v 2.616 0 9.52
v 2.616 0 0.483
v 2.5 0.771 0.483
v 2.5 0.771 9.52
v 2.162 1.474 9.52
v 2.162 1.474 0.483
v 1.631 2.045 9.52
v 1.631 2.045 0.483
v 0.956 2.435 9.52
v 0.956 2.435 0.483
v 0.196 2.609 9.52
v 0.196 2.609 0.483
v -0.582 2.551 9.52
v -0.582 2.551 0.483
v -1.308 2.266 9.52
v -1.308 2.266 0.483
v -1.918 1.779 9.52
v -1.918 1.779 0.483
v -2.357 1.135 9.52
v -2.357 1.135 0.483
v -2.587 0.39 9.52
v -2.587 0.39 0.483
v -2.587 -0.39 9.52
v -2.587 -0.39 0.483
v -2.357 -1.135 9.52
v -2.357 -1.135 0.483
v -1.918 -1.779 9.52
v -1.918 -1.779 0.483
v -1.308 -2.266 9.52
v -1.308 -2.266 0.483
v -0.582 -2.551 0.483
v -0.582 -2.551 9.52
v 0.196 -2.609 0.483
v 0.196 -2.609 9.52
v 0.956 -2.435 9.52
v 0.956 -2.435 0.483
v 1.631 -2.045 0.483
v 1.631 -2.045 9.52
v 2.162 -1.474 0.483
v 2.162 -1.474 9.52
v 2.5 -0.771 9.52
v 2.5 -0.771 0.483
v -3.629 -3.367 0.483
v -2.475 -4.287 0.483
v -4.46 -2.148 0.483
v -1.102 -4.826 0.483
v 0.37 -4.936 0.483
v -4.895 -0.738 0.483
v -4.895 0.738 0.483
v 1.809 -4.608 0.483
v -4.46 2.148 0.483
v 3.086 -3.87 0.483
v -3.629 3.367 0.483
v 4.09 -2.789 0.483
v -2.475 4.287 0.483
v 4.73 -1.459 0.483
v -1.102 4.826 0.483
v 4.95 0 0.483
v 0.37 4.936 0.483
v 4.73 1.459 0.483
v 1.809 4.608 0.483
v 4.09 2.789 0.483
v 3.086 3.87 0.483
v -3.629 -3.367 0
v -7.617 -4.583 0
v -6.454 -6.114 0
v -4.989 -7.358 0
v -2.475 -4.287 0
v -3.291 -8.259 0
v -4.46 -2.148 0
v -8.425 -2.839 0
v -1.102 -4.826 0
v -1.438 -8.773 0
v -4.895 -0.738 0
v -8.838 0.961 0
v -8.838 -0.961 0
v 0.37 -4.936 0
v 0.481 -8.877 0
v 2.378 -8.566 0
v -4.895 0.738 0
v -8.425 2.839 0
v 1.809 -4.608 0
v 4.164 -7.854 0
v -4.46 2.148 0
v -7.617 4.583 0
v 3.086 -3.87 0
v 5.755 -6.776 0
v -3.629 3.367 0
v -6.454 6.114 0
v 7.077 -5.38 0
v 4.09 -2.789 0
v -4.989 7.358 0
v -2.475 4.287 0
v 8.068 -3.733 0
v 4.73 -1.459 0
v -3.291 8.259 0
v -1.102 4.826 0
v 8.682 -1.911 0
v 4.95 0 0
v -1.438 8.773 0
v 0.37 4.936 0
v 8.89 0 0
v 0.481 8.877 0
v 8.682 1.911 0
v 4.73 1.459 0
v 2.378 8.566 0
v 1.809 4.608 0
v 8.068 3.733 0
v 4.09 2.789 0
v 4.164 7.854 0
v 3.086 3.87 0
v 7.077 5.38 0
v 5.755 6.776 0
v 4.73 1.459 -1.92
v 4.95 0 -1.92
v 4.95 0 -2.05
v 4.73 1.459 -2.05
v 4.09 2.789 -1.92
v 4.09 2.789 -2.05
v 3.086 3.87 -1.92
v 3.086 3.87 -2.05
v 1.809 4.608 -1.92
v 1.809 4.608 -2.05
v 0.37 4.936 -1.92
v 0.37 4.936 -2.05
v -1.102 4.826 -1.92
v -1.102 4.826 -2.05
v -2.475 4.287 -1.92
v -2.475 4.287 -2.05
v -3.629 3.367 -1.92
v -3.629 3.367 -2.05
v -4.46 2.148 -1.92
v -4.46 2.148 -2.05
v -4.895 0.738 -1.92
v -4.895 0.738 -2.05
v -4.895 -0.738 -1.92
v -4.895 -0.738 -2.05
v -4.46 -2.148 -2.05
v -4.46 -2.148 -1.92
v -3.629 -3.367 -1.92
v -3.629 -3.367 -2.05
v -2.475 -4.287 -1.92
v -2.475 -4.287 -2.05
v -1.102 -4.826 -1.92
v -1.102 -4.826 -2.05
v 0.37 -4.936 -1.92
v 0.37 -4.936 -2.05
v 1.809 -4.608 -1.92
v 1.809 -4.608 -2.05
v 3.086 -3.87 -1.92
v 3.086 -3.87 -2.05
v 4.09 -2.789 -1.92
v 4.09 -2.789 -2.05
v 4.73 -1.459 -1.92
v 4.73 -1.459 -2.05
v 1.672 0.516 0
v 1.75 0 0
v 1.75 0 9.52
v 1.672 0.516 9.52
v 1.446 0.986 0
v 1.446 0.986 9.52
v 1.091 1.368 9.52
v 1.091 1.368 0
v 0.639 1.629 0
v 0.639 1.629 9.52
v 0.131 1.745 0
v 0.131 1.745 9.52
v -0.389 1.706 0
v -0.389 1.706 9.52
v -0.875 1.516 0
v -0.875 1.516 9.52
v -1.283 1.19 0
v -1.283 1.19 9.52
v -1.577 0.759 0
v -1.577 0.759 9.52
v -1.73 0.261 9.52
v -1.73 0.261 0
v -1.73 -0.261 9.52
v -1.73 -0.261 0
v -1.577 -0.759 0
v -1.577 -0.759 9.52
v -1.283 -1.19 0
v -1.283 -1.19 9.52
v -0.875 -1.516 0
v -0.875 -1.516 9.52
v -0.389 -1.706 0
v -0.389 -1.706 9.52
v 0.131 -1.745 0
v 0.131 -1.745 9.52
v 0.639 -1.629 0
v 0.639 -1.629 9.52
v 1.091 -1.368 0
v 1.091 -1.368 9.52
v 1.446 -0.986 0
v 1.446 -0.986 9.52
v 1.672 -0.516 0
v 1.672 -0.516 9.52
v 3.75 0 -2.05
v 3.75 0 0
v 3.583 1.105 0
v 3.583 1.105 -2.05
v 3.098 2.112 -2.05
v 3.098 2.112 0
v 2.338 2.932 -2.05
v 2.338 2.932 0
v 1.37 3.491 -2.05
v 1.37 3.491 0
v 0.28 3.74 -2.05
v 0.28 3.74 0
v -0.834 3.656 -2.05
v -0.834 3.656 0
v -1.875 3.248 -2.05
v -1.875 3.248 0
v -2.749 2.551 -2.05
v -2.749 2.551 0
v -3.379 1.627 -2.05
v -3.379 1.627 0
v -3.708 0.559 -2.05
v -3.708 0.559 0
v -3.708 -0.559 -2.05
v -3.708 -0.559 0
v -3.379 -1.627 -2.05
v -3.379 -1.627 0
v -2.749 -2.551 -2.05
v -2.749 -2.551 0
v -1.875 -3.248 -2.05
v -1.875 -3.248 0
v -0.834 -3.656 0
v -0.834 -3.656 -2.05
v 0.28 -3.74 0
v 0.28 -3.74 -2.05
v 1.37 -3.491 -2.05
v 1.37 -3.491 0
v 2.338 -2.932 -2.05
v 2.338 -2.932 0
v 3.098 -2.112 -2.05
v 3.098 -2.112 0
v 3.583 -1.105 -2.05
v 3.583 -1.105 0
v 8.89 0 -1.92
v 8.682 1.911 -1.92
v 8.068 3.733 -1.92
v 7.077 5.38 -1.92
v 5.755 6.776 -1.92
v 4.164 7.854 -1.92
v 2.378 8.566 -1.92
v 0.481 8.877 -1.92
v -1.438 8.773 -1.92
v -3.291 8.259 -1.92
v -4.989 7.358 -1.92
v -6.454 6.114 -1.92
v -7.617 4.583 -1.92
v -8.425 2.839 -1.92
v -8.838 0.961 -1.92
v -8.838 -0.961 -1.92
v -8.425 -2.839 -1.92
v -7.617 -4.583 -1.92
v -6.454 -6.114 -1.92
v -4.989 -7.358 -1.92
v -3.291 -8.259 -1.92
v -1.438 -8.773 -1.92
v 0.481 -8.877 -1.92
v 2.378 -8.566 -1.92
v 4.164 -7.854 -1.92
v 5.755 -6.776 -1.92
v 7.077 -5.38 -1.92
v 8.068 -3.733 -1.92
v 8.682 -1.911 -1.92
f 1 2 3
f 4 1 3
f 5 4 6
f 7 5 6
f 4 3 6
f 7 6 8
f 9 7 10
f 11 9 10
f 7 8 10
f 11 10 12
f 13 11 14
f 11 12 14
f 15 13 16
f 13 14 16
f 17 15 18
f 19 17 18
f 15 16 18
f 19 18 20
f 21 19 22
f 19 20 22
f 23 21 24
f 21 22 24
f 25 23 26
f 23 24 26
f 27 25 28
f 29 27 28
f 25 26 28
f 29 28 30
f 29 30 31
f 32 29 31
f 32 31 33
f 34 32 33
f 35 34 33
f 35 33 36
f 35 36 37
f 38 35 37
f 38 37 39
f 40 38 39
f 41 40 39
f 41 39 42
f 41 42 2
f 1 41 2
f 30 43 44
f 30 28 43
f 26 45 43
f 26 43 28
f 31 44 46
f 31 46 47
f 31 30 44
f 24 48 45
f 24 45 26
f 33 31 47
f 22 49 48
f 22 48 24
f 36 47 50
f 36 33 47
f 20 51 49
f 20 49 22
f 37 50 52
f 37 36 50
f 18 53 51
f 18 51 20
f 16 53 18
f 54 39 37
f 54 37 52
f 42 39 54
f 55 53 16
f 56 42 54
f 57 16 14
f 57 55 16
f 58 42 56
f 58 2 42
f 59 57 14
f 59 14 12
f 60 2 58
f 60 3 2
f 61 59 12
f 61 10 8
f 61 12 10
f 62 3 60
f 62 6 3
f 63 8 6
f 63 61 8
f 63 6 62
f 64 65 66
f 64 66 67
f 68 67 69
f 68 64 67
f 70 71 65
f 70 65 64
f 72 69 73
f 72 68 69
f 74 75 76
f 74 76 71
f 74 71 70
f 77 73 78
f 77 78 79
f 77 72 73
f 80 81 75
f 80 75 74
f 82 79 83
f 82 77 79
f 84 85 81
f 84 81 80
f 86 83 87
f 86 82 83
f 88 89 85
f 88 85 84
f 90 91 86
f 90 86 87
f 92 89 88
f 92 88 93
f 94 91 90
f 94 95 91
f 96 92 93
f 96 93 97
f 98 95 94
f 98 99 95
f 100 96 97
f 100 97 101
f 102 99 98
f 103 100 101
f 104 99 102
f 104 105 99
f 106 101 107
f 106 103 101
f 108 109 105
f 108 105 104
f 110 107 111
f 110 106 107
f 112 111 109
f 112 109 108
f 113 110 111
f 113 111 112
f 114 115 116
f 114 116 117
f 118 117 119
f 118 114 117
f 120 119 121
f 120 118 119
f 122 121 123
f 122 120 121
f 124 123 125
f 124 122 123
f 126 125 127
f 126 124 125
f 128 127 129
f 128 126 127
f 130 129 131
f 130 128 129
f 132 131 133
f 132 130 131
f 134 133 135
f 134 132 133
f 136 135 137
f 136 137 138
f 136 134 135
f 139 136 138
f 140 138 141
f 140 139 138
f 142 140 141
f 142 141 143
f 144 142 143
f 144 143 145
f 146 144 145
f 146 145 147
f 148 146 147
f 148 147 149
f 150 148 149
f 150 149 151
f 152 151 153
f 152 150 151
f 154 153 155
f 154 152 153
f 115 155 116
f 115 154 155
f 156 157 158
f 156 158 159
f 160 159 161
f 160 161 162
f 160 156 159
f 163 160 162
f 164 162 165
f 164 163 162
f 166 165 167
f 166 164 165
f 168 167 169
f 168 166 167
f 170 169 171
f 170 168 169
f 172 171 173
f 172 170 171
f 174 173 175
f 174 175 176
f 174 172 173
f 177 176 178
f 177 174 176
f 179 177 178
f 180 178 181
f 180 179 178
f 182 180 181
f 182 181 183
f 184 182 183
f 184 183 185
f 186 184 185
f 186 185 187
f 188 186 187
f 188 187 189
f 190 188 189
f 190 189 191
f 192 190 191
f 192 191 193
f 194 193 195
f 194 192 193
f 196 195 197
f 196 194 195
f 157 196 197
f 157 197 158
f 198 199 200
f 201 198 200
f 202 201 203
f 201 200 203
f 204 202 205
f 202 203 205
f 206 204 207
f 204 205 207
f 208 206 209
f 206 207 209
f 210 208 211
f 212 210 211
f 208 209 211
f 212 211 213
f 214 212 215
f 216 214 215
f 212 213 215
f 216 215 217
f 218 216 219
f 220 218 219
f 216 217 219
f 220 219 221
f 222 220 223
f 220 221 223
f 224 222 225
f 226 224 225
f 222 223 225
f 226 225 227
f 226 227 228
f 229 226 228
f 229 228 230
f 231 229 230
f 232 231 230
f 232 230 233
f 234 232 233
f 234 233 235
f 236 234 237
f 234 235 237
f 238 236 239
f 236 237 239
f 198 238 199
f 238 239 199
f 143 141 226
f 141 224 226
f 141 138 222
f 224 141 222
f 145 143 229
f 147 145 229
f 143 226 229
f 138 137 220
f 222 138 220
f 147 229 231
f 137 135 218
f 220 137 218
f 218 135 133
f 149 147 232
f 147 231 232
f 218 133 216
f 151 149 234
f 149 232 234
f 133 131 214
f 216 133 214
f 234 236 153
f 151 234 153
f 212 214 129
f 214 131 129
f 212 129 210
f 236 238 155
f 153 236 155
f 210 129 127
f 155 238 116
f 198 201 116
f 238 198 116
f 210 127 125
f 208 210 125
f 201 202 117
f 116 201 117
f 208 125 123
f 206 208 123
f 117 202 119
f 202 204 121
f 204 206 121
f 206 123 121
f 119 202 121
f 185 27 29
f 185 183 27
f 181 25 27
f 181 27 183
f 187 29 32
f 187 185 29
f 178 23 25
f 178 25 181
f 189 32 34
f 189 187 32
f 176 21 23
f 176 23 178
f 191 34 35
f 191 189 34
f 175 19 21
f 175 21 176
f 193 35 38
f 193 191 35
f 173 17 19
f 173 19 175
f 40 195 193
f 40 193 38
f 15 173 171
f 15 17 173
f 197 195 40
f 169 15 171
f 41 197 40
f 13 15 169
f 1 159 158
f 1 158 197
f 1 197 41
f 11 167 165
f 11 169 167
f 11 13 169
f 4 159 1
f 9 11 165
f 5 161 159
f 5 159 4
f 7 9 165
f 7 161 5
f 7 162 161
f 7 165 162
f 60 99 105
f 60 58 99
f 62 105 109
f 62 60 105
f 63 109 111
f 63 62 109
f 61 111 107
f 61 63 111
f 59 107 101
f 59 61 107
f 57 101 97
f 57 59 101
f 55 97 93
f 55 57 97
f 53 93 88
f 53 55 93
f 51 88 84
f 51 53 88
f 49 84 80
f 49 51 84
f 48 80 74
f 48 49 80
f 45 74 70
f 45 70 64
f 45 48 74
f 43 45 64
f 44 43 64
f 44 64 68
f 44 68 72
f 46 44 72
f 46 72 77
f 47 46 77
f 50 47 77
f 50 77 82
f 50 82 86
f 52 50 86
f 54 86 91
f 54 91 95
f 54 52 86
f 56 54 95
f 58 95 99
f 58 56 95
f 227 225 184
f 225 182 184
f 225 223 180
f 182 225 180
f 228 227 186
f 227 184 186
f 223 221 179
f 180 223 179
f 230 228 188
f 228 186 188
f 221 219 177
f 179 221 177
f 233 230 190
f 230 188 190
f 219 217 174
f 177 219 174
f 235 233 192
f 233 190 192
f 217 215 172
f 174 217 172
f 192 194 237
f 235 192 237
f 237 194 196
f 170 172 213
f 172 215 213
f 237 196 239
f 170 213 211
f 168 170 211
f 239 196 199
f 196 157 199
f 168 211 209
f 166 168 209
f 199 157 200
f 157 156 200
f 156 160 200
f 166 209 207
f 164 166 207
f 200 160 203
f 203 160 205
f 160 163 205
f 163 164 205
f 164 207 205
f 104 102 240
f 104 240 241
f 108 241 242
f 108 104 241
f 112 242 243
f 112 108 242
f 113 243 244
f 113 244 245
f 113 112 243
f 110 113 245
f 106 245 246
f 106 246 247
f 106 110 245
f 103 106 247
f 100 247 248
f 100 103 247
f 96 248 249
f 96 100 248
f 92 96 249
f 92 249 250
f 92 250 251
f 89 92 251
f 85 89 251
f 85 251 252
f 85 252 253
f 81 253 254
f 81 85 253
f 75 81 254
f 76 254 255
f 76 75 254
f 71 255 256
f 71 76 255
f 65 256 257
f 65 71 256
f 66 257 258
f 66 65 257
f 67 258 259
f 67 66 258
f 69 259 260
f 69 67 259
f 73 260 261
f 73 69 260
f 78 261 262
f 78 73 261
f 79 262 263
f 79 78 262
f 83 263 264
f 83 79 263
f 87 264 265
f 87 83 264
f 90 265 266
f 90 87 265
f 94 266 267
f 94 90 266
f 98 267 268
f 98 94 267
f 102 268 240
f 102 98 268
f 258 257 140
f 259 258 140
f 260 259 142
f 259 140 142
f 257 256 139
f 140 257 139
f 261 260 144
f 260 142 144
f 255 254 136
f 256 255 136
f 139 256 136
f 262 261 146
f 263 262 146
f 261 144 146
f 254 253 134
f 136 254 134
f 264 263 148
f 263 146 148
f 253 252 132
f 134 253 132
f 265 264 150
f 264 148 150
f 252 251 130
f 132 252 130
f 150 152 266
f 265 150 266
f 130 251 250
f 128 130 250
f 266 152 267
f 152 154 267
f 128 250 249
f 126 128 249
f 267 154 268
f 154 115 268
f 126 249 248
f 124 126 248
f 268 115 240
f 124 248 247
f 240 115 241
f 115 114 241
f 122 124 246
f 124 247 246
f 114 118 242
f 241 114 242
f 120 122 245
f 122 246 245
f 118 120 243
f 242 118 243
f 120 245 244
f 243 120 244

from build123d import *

# Parameters (mm, degrees)
F0_R     = 2.6162
F0_R_2   = 1.75
F1_DEPTH = 9.52
F0_R_3   = 4.950253
F0_R_4   = 3.75
F2_DEPTH = 0.4826
F3_DEPTH = 2.05
F0_R_5   = 8.89
F4_DEPTH = 1.92


with BuildPart() as f1:
    # F0 (on Top) → F1 (new body)
    with BuildSketch(Plane.XY):
        Circle(F0_R)
        Circle(F0_R_2, mode=Mode.SUBTRACT)
    extrude(amount=F1_DEPTH)

    # F0 (on Top) → F2 (join)
    with BuildSketch(Plane.XY):
        Circle(F0_R_3)
        Circle(F0_R_4, mode=Mode.SUBTRACT)
        Circle(F0_R_4)
        Circle(F0_R, mode=Mode.SUBTRACT)
    extrude(amount=F2_DEPTH)

    # F0 (on Top) → F3 (join)
    with BuildSketch(Plane.XY):
        Circle(F0_R_3)
        Circle(F0_R_4, mode=Mode.SUBTRACT)
    extrude(amount=-F3_DEPTH)

    # F0 (on Top) → F4 (join)
    with BuildSketch(Plane.XY):
        Circle(F0_R_5)
        Circle(F0_R_3, mode=Mode.SUBTRACT)
    extrude(amount=-F4_DEPTH)


solid = f1.part
